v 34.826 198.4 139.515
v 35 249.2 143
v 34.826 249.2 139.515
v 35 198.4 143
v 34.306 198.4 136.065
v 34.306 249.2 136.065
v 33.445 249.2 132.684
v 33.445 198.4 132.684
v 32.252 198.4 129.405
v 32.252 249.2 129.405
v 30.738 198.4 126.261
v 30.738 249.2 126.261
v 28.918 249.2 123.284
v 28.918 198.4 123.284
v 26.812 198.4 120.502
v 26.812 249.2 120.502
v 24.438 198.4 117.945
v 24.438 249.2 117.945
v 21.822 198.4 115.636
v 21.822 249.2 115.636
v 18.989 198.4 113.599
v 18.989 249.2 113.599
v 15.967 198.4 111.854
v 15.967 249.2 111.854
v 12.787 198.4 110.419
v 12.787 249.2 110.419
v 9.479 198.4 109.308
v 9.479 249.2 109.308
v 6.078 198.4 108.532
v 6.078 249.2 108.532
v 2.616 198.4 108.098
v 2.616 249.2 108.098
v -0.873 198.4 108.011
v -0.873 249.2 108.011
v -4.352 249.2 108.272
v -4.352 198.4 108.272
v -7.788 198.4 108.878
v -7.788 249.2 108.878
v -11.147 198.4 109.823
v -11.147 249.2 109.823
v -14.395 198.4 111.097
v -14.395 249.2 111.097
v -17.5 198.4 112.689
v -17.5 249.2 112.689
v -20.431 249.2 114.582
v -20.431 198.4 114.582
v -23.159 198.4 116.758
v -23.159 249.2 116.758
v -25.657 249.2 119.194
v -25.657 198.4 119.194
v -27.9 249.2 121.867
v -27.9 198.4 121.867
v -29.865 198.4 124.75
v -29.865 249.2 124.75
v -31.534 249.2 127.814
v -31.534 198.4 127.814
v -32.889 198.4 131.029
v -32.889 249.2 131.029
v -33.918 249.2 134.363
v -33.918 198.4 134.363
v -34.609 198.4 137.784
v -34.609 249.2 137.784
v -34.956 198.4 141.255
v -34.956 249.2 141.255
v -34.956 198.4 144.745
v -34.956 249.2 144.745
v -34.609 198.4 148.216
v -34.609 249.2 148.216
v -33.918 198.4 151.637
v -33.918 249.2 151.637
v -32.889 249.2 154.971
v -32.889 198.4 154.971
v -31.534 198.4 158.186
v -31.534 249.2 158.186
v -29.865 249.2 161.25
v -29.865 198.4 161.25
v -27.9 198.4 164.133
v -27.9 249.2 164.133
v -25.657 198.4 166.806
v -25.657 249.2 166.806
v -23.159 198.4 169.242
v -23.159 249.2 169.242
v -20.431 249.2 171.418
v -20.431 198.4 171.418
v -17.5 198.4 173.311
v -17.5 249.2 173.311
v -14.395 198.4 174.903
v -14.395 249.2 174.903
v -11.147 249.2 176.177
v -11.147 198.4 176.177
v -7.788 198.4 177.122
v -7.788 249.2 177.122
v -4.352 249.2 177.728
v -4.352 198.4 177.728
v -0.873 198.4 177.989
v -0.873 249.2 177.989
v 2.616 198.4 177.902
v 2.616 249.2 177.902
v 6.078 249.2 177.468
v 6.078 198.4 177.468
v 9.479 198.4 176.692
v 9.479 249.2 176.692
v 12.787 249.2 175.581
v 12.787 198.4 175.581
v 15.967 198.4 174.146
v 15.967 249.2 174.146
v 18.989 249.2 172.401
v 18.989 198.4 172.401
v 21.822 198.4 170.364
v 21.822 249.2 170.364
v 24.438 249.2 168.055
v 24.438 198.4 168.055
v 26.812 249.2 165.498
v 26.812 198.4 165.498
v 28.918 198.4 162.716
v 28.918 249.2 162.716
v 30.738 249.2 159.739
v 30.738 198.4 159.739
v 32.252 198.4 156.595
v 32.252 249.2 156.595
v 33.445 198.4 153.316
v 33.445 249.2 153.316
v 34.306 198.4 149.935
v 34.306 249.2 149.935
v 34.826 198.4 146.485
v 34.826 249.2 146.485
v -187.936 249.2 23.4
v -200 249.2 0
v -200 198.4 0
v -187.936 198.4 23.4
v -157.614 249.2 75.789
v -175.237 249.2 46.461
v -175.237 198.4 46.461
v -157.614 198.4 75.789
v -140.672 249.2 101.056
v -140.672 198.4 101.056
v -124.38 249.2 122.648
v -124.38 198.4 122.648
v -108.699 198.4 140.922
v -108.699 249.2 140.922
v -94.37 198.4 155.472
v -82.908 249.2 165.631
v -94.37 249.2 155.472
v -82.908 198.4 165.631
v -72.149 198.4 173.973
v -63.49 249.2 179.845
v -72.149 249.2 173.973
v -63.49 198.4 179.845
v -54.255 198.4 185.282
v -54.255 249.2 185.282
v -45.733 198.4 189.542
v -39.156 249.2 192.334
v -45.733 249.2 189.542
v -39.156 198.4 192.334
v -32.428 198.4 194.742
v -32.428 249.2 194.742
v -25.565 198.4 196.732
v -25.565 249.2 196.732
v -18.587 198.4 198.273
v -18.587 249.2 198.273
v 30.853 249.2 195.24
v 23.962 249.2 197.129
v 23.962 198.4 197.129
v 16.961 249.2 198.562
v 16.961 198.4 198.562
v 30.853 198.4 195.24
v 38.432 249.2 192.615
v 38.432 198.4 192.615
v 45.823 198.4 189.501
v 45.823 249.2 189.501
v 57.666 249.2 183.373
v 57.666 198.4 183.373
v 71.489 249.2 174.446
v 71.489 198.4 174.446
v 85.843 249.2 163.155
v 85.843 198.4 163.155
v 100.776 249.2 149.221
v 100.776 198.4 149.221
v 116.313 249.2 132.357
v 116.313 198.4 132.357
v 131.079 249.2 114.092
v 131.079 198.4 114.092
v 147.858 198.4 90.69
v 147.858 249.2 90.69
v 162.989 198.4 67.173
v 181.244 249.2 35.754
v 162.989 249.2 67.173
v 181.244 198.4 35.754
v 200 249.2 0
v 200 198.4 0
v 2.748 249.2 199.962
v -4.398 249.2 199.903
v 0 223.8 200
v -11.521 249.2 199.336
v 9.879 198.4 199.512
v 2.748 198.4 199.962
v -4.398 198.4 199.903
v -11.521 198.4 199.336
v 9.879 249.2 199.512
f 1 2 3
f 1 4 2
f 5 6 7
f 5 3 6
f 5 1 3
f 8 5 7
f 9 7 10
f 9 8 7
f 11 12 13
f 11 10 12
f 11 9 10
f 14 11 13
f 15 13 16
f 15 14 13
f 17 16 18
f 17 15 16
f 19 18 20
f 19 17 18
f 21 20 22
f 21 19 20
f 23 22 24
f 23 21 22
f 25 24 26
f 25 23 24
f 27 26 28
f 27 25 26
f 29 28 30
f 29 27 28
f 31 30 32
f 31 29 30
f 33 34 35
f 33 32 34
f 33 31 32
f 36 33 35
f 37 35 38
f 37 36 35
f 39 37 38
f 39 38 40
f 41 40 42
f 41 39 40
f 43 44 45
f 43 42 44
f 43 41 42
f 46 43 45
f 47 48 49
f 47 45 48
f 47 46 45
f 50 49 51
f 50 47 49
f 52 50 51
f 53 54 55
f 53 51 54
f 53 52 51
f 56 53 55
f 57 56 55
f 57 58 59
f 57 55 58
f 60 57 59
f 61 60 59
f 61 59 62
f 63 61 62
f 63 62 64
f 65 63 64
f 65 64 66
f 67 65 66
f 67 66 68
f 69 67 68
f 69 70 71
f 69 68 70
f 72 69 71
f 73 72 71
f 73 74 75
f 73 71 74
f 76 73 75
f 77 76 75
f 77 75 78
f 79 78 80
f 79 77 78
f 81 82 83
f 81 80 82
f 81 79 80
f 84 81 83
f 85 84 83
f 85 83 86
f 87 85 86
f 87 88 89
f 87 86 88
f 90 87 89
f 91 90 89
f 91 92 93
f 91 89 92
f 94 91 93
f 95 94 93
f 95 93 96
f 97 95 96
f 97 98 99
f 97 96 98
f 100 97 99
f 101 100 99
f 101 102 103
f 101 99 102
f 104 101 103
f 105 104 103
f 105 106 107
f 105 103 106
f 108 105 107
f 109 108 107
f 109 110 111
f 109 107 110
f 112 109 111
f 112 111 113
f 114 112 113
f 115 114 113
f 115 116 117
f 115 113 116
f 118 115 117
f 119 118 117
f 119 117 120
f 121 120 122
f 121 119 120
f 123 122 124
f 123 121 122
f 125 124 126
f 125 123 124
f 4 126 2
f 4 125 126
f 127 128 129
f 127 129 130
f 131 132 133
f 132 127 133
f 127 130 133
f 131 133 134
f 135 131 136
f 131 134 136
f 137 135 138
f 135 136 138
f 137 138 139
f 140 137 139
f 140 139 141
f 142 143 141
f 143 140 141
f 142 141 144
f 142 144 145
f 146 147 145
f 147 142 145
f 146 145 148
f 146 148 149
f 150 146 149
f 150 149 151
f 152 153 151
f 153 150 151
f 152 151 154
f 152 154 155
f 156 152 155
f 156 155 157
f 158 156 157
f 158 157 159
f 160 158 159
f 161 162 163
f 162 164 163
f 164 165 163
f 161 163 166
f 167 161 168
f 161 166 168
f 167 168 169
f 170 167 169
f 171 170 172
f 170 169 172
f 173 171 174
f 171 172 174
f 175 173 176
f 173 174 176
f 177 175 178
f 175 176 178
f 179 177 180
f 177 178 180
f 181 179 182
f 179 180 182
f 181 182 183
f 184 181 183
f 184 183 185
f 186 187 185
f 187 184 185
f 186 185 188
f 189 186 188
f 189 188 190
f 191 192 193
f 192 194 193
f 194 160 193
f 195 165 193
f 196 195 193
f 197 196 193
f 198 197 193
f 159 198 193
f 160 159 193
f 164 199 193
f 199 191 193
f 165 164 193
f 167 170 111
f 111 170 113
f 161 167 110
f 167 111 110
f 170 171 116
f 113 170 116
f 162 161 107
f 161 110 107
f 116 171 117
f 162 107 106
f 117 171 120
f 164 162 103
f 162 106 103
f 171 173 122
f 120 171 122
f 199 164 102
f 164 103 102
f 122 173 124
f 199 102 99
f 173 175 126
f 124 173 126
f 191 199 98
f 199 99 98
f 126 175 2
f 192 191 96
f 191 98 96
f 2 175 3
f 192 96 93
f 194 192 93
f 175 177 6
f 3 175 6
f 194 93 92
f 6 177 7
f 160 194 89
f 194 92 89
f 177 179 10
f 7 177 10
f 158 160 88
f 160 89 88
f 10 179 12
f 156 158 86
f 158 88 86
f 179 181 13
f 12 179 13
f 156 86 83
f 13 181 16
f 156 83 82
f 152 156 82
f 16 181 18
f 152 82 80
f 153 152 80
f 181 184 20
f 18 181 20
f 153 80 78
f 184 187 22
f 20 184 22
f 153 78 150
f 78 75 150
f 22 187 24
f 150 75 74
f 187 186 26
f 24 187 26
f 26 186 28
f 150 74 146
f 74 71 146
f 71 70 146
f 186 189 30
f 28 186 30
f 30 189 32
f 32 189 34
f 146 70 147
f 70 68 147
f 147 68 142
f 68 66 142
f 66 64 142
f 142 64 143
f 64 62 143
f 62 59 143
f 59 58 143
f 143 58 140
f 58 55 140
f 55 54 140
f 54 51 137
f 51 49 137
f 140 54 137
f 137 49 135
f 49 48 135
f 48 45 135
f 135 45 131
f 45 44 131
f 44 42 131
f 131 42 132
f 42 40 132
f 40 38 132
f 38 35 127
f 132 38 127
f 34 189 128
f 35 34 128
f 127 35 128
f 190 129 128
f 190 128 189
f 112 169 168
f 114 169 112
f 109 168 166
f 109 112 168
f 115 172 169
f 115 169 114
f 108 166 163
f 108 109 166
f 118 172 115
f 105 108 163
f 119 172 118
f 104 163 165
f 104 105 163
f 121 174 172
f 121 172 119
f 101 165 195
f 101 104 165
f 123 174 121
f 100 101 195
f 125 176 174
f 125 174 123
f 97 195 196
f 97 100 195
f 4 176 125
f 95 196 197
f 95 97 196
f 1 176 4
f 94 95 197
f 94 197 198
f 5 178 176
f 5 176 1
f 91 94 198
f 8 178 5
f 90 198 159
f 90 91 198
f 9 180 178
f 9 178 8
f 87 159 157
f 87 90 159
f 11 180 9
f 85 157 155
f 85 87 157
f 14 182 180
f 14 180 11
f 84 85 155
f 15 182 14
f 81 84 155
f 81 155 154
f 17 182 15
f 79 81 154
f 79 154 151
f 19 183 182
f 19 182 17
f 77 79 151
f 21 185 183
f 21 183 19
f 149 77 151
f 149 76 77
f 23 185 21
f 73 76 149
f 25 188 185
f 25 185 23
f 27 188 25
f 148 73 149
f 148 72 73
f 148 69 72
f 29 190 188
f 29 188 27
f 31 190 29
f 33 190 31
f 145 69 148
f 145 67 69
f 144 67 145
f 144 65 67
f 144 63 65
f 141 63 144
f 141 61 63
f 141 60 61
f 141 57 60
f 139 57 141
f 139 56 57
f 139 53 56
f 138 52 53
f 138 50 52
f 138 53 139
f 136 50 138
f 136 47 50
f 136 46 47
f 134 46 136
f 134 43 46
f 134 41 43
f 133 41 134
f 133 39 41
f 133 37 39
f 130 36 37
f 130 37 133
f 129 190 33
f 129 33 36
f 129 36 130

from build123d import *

# Parameters (mm, degrees)
BOSS_EXTRUDE1_DEPTH     = 300
SKETCH3_R               = 15.5
CUT_EXTRUDE1_DEPTH      = 23
CUT_EXTRUDE1_DEPTH_BACK = 23
SKETCH4_R               = 35
CUT_EXTRUDE3_DEPTH      = 300
SKETCH5_W               = 496.22566609
SKETCH5_H               = 70.680473068
SKETCH5_W_2             = 504.512342242
SKETCH5_H_2             = 238.363802277
CUT_EXTRUDE4_DEPTH      = 201.0000001


with BuildPart() as part:
    # Sketch1 → Boss-Extrude1 (new body)
    with BuildSketch(Plane(origin=(0, 0, 0), x_dir=(1, 0, 0), z_dir=(0, 1, 0))):
        with BuildLine():
            Line((-200, 1e-09), (200, 1e-09))
            add(Edge.make_bspline(
                [(-200, 1e-09), (0, -400.000000001), (200, 1e-09)],
                knots=[0.056028396, 0.056028396, 0.056028396, 0.943971604, 0.943971604, 0.943971604], degree=2))
        make_face()
    extrude(amount=BOSS_EXTRUDE1_DEPTH)

    # Sketch3 → Cut-Extrude1 (cut, two sides)
    with BuildSketch(Plane(origin=(0, 150, 0), x_dir=(1, 0, 0), z_dir=(0, 1, 0))) as cut_extrude1_sk:
        with Locations((0, -142.999999999)):
            Circle(SKETCH3_R)
    extrude(amount=CUT_EXTRUDE1_DEPTH, mode=Mode.SUBTRACT)
    extrude(cut_extrude1_sk.sketch, amount=-CUT_EXTRUDE1_DEPTH_BACK, mode=Mode.SUBTRACT)

    # Sketch4 → Cut-Extrude3 (cut)
    with BuildSketch(Plane(origin=(0, 173, 0), x_dir=(1, 0, 0), z_dir=(0, 1, 0))):
        with Locations((0, -142.999999999)):
            Circle(SKETCH4_R)
    cut_extrude3 = extrude(amount=CUT_EXTRUDE3_DEPTH, mode=Mode.SUBTRACT)

    # Mirror1: Cut-Extrude3 across plane
    add(cut_extrude3.mirror(Plane.ZX.offset(150)), mode=Mode.SUBTRACT)

    # Sketch5 → Cut-Extrude4 (cut, through all)
    with BuildSketch(Plane(origin=(0, 0, 0), x_dir=(-1, 0, 0), z_dir=(0, 0, -1))):
        with Locations((-4.143338076, 284.540236534)):
            Rectangle(SKETCH5_W, SKETCH5_H)
        with Locations((0, 79.218098862)):
            Rectangle(SKETCH5_W_2, SKETCH5_H_2)
    extrude(amount=-CUT_EXTRUDE4_DEPTH, mode=Mode.SUBTRACT)


solid = part.part
